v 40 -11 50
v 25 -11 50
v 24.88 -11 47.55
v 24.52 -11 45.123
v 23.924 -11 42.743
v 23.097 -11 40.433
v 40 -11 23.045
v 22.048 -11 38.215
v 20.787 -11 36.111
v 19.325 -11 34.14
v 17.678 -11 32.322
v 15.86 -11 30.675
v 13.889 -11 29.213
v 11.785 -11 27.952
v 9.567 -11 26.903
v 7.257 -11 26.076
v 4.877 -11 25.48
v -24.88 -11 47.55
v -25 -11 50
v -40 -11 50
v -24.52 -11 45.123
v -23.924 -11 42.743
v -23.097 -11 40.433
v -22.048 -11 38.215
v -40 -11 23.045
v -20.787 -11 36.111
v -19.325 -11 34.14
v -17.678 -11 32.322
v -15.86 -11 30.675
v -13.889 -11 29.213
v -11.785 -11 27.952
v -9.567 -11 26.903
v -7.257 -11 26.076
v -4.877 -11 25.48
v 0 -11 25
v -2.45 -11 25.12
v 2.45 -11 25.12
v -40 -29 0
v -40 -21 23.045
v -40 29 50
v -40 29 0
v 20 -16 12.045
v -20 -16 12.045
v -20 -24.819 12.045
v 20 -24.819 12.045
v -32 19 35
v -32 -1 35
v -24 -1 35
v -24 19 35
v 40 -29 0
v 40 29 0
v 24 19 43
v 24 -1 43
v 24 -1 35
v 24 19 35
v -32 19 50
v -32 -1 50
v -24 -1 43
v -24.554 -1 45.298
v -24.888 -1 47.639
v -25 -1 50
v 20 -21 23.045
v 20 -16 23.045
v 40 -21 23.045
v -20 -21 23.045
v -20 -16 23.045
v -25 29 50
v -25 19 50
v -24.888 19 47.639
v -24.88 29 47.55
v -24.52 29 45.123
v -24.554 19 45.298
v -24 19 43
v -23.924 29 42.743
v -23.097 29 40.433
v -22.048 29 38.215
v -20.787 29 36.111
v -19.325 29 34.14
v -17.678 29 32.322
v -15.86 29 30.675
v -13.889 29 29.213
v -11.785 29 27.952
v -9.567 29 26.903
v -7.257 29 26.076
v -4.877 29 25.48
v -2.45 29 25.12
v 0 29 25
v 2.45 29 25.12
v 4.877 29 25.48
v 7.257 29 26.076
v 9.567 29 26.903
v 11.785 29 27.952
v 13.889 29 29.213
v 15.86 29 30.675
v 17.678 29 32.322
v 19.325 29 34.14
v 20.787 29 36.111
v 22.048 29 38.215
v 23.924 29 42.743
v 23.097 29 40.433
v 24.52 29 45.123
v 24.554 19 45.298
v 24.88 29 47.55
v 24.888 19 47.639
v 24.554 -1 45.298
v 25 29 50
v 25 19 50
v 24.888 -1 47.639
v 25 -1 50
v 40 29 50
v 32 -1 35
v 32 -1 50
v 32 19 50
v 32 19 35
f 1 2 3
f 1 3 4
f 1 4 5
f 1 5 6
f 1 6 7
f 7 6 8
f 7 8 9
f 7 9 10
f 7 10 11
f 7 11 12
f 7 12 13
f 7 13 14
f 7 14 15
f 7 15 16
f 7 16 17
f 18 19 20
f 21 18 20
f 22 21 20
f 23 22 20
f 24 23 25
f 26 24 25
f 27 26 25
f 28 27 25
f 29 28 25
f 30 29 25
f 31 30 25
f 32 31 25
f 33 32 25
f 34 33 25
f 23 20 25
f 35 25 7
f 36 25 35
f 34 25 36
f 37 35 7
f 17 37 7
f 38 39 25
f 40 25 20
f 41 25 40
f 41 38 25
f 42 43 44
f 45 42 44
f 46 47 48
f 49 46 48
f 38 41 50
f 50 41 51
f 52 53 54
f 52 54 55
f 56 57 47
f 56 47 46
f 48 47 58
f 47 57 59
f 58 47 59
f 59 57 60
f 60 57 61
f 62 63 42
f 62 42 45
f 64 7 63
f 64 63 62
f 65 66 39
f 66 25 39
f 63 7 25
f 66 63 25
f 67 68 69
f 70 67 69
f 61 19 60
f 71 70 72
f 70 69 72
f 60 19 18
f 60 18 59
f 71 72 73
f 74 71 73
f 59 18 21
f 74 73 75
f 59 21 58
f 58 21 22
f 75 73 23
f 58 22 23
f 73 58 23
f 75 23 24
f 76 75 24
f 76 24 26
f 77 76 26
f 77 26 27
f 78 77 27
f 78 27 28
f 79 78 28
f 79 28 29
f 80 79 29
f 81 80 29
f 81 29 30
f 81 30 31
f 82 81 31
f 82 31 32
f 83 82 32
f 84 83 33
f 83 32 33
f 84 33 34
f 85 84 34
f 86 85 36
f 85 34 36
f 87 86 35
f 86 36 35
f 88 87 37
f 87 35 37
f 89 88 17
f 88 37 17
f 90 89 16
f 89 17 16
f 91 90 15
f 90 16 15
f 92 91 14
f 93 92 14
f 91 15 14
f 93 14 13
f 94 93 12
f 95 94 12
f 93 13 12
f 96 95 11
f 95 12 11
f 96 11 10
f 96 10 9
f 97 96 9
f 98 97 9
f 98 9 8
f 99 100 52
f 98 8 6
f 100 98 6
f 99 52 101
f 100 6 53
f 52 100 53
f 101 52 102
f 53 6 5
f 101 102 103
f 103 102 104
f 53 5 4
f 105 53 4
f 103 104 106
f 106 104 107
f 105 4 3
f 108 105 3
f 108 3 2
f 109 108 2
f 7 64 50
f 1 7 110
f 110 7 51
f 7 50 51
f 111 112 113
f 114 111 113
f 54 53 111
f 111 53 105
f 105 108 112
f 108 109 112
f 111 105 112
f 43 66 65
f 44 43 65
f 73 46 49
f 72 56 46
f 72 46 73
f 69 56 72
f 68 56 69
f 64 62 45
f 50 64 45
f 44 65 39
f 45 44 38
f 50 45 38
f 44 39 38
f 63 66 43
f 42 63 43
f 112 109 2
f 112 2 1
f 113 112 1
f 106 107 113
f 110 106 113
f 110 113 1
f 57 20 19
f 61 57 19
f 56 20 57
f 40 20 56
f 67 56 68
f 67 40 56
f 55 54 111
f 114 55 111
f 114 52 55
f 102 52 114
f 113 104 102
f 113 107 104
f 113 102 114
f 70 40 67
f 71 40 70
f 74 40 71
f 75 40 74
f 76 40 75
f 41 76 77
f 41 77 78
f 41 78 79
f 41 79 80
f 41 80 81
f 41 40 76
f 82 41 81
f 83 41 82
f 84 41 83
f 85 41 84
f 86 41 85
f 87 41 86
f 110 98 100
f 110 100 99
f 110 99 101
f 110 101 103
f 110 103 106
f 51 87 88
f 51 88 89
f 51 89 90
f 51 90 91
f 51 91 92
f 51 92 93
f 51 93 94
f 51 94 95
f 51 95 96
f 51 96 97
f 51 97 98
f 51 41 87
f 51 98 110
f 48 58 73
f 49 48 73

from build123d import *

# Parameters (mm, degrees)
F0_W      = 80
F0_H      = 58
F1_DEPTH  = 50
F3_DEPTH  = 80.001
F6_DEPTH  = 40
F7_W      = 8
F7_H      = 20
F8_DEPTH  = 15
F10_DEPTH = 40.001


with BuildPart() as f1:
    # F0 (on Top) → F1 (new body)
    with BuildSketch(Plane.XY):
        Rectangle(F0_W, F0_H)
    extrude(amount=F1_DEPTH)

    # F2 (on face) → F3 (cut, through all)
    with BuildSketch(Plane(origin=(-40, 0, 0), x_dir=(0, -1, 0), z_dir=(-1, 0, 0))):
        Polygon((29, 50), (11, 50), (11, 23.0452120304), (21, 23.0452120304), (29, 0), align=None)
    extrude(amount=-F3_DEPTH, mode=Mode.SUBTRACT)

    # F5 (on offset) → F6 (cut)
    with BuildSketch(Plane(origin=(-20, 0, 0), x_dir=(0, -1, 0), z_dir=(-1, 0, 0))):
        Polygon((24.8185806181, 12.0452120304), (21, 23.0452120304), (16, 23.0452120304), (16, 12.0452120304), align=None)
    extrude(amount=-F6_DEPTH, mode=Mode.SUBTRACT)

    # F7 (on face) → F8 (cut)
    with BuildSketch(Plane.XY.offset(50)):
        with Locations((-28, 9)):
            Rectangle(F7_W, F7_H)
        with Locations((28, 9)):
            Rectangle(F7_W, F7_H)
    extrude(amount=-F8_DEPTH, mode=Mode.SUBTRACT)

    # F9 (on face) → F10 (cut, through all)
    with BuildSketch(Plane.XZ.offset(11)):
        with BuildLine():
            Line((25, 50), (-25, 50))
            ThreePointArc((-25, 50), (0, 25), (25, 50))
        make_face()
    extrude(amount=-F10_DEPTH, mode=Mode.SUBTRACT)


solid = f1.part
